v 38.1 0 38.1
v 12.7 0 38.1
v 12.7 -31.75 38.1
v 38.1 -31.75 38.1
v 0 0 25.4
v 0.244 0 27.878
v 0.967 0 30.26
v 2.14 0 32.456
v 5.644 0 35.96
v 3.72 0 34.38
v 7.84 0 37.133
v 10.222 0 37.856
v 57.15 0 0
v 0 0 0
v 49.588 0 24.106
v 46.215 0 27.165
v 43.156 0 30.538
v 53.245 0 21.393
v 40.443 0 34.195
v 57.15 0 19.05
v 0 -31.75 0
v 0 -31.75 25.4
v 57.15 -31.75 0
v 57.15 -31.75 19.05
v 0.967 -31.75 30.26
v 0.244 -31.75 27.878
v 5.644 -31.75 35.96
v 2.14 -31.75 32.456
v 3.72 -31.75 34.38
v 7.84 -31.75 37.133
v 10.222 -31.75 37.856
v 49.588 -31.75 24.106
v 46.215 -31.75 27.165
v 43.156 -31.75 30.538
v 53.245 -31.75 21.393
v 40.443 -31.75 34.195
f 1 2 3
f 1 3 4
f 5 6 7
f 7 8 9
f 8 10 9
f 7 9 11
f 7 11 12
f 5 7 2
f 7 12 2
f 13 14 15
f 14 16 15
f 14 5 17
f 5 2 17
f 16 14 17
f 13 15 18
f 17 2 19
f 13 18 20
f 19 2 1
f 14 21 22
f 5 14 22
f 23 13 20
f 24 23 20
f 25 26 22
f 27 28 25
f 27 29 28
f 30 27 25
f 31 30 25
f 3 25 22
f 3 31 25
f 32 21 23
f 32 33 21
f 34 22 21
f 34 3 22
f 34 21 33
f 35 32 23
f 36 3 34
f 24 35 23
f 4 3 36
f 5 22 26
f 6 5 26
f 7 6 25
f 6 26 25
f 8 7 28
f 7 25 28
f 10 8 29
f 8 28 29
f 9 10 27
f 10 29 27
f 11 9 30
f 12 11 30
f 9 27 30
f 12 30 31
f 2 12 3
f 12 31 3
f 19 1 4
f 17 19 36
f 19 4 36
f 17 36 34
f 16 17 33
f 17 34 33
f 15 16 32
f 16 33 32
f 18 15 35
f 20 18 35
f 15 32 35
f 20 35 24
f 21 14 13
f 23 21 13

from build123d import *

# Parameters (mm, degrees)
F0_W     = 57.15
F0_H     = 38.1
F1_DEPTH = 31.75
F3_DEPTH = 31.75
F5_DEPTH = 31.75


# Not quite as in the source:
# - a length typed as a fraction of an inch, garbled in the dataset ("3 / 203.2 mm" for 3/8 in), is restored
# - a feature names something its author has since deleted; it is built from what else it names


with BuildPart() as f1:
    # F0 (on Front) → F1 (new body)
    with BuildSketch(Plane.XZ):
        with Locations((28.575, 19.05)):
            Rectangle(F0_W, F0_H)
    extrude(amount=F1_DEPTH)

    # F2 (on face) → F3 (cut)
    with BuildSketch(Plane.XZ.offset(31.75)):
        with BuildLine():
            Line((57.15, 38.1), (38.1, 38.1))
            ThreePointArc((38.1, 38.1), (46.2145934678, 27.1645934678), (57.15, 19.05))
            Line((57.15, 19.05), (57.15, 38.1))
        make_face()
    extrude(amount=-F3_DEPTH, mode=Mode.SUBTRACT)

    # F4 (on face) → F5 (cut)
    with BuildSketch(Plane.XZ.offset(31.75)):
        with BuildLine():
            Line((0, 38.1), (0, 25.4))
            ThreePointArc((0, 25.4), (3.7197438789, 34.3802561211), (12.7, 38.1))
            Line((12.7, 38.1), (0, 38.1))
        make_face()
    extrude(amount=-F5_DEPTH, mode=Mode.SUBTRACT)


solid = f1.part
